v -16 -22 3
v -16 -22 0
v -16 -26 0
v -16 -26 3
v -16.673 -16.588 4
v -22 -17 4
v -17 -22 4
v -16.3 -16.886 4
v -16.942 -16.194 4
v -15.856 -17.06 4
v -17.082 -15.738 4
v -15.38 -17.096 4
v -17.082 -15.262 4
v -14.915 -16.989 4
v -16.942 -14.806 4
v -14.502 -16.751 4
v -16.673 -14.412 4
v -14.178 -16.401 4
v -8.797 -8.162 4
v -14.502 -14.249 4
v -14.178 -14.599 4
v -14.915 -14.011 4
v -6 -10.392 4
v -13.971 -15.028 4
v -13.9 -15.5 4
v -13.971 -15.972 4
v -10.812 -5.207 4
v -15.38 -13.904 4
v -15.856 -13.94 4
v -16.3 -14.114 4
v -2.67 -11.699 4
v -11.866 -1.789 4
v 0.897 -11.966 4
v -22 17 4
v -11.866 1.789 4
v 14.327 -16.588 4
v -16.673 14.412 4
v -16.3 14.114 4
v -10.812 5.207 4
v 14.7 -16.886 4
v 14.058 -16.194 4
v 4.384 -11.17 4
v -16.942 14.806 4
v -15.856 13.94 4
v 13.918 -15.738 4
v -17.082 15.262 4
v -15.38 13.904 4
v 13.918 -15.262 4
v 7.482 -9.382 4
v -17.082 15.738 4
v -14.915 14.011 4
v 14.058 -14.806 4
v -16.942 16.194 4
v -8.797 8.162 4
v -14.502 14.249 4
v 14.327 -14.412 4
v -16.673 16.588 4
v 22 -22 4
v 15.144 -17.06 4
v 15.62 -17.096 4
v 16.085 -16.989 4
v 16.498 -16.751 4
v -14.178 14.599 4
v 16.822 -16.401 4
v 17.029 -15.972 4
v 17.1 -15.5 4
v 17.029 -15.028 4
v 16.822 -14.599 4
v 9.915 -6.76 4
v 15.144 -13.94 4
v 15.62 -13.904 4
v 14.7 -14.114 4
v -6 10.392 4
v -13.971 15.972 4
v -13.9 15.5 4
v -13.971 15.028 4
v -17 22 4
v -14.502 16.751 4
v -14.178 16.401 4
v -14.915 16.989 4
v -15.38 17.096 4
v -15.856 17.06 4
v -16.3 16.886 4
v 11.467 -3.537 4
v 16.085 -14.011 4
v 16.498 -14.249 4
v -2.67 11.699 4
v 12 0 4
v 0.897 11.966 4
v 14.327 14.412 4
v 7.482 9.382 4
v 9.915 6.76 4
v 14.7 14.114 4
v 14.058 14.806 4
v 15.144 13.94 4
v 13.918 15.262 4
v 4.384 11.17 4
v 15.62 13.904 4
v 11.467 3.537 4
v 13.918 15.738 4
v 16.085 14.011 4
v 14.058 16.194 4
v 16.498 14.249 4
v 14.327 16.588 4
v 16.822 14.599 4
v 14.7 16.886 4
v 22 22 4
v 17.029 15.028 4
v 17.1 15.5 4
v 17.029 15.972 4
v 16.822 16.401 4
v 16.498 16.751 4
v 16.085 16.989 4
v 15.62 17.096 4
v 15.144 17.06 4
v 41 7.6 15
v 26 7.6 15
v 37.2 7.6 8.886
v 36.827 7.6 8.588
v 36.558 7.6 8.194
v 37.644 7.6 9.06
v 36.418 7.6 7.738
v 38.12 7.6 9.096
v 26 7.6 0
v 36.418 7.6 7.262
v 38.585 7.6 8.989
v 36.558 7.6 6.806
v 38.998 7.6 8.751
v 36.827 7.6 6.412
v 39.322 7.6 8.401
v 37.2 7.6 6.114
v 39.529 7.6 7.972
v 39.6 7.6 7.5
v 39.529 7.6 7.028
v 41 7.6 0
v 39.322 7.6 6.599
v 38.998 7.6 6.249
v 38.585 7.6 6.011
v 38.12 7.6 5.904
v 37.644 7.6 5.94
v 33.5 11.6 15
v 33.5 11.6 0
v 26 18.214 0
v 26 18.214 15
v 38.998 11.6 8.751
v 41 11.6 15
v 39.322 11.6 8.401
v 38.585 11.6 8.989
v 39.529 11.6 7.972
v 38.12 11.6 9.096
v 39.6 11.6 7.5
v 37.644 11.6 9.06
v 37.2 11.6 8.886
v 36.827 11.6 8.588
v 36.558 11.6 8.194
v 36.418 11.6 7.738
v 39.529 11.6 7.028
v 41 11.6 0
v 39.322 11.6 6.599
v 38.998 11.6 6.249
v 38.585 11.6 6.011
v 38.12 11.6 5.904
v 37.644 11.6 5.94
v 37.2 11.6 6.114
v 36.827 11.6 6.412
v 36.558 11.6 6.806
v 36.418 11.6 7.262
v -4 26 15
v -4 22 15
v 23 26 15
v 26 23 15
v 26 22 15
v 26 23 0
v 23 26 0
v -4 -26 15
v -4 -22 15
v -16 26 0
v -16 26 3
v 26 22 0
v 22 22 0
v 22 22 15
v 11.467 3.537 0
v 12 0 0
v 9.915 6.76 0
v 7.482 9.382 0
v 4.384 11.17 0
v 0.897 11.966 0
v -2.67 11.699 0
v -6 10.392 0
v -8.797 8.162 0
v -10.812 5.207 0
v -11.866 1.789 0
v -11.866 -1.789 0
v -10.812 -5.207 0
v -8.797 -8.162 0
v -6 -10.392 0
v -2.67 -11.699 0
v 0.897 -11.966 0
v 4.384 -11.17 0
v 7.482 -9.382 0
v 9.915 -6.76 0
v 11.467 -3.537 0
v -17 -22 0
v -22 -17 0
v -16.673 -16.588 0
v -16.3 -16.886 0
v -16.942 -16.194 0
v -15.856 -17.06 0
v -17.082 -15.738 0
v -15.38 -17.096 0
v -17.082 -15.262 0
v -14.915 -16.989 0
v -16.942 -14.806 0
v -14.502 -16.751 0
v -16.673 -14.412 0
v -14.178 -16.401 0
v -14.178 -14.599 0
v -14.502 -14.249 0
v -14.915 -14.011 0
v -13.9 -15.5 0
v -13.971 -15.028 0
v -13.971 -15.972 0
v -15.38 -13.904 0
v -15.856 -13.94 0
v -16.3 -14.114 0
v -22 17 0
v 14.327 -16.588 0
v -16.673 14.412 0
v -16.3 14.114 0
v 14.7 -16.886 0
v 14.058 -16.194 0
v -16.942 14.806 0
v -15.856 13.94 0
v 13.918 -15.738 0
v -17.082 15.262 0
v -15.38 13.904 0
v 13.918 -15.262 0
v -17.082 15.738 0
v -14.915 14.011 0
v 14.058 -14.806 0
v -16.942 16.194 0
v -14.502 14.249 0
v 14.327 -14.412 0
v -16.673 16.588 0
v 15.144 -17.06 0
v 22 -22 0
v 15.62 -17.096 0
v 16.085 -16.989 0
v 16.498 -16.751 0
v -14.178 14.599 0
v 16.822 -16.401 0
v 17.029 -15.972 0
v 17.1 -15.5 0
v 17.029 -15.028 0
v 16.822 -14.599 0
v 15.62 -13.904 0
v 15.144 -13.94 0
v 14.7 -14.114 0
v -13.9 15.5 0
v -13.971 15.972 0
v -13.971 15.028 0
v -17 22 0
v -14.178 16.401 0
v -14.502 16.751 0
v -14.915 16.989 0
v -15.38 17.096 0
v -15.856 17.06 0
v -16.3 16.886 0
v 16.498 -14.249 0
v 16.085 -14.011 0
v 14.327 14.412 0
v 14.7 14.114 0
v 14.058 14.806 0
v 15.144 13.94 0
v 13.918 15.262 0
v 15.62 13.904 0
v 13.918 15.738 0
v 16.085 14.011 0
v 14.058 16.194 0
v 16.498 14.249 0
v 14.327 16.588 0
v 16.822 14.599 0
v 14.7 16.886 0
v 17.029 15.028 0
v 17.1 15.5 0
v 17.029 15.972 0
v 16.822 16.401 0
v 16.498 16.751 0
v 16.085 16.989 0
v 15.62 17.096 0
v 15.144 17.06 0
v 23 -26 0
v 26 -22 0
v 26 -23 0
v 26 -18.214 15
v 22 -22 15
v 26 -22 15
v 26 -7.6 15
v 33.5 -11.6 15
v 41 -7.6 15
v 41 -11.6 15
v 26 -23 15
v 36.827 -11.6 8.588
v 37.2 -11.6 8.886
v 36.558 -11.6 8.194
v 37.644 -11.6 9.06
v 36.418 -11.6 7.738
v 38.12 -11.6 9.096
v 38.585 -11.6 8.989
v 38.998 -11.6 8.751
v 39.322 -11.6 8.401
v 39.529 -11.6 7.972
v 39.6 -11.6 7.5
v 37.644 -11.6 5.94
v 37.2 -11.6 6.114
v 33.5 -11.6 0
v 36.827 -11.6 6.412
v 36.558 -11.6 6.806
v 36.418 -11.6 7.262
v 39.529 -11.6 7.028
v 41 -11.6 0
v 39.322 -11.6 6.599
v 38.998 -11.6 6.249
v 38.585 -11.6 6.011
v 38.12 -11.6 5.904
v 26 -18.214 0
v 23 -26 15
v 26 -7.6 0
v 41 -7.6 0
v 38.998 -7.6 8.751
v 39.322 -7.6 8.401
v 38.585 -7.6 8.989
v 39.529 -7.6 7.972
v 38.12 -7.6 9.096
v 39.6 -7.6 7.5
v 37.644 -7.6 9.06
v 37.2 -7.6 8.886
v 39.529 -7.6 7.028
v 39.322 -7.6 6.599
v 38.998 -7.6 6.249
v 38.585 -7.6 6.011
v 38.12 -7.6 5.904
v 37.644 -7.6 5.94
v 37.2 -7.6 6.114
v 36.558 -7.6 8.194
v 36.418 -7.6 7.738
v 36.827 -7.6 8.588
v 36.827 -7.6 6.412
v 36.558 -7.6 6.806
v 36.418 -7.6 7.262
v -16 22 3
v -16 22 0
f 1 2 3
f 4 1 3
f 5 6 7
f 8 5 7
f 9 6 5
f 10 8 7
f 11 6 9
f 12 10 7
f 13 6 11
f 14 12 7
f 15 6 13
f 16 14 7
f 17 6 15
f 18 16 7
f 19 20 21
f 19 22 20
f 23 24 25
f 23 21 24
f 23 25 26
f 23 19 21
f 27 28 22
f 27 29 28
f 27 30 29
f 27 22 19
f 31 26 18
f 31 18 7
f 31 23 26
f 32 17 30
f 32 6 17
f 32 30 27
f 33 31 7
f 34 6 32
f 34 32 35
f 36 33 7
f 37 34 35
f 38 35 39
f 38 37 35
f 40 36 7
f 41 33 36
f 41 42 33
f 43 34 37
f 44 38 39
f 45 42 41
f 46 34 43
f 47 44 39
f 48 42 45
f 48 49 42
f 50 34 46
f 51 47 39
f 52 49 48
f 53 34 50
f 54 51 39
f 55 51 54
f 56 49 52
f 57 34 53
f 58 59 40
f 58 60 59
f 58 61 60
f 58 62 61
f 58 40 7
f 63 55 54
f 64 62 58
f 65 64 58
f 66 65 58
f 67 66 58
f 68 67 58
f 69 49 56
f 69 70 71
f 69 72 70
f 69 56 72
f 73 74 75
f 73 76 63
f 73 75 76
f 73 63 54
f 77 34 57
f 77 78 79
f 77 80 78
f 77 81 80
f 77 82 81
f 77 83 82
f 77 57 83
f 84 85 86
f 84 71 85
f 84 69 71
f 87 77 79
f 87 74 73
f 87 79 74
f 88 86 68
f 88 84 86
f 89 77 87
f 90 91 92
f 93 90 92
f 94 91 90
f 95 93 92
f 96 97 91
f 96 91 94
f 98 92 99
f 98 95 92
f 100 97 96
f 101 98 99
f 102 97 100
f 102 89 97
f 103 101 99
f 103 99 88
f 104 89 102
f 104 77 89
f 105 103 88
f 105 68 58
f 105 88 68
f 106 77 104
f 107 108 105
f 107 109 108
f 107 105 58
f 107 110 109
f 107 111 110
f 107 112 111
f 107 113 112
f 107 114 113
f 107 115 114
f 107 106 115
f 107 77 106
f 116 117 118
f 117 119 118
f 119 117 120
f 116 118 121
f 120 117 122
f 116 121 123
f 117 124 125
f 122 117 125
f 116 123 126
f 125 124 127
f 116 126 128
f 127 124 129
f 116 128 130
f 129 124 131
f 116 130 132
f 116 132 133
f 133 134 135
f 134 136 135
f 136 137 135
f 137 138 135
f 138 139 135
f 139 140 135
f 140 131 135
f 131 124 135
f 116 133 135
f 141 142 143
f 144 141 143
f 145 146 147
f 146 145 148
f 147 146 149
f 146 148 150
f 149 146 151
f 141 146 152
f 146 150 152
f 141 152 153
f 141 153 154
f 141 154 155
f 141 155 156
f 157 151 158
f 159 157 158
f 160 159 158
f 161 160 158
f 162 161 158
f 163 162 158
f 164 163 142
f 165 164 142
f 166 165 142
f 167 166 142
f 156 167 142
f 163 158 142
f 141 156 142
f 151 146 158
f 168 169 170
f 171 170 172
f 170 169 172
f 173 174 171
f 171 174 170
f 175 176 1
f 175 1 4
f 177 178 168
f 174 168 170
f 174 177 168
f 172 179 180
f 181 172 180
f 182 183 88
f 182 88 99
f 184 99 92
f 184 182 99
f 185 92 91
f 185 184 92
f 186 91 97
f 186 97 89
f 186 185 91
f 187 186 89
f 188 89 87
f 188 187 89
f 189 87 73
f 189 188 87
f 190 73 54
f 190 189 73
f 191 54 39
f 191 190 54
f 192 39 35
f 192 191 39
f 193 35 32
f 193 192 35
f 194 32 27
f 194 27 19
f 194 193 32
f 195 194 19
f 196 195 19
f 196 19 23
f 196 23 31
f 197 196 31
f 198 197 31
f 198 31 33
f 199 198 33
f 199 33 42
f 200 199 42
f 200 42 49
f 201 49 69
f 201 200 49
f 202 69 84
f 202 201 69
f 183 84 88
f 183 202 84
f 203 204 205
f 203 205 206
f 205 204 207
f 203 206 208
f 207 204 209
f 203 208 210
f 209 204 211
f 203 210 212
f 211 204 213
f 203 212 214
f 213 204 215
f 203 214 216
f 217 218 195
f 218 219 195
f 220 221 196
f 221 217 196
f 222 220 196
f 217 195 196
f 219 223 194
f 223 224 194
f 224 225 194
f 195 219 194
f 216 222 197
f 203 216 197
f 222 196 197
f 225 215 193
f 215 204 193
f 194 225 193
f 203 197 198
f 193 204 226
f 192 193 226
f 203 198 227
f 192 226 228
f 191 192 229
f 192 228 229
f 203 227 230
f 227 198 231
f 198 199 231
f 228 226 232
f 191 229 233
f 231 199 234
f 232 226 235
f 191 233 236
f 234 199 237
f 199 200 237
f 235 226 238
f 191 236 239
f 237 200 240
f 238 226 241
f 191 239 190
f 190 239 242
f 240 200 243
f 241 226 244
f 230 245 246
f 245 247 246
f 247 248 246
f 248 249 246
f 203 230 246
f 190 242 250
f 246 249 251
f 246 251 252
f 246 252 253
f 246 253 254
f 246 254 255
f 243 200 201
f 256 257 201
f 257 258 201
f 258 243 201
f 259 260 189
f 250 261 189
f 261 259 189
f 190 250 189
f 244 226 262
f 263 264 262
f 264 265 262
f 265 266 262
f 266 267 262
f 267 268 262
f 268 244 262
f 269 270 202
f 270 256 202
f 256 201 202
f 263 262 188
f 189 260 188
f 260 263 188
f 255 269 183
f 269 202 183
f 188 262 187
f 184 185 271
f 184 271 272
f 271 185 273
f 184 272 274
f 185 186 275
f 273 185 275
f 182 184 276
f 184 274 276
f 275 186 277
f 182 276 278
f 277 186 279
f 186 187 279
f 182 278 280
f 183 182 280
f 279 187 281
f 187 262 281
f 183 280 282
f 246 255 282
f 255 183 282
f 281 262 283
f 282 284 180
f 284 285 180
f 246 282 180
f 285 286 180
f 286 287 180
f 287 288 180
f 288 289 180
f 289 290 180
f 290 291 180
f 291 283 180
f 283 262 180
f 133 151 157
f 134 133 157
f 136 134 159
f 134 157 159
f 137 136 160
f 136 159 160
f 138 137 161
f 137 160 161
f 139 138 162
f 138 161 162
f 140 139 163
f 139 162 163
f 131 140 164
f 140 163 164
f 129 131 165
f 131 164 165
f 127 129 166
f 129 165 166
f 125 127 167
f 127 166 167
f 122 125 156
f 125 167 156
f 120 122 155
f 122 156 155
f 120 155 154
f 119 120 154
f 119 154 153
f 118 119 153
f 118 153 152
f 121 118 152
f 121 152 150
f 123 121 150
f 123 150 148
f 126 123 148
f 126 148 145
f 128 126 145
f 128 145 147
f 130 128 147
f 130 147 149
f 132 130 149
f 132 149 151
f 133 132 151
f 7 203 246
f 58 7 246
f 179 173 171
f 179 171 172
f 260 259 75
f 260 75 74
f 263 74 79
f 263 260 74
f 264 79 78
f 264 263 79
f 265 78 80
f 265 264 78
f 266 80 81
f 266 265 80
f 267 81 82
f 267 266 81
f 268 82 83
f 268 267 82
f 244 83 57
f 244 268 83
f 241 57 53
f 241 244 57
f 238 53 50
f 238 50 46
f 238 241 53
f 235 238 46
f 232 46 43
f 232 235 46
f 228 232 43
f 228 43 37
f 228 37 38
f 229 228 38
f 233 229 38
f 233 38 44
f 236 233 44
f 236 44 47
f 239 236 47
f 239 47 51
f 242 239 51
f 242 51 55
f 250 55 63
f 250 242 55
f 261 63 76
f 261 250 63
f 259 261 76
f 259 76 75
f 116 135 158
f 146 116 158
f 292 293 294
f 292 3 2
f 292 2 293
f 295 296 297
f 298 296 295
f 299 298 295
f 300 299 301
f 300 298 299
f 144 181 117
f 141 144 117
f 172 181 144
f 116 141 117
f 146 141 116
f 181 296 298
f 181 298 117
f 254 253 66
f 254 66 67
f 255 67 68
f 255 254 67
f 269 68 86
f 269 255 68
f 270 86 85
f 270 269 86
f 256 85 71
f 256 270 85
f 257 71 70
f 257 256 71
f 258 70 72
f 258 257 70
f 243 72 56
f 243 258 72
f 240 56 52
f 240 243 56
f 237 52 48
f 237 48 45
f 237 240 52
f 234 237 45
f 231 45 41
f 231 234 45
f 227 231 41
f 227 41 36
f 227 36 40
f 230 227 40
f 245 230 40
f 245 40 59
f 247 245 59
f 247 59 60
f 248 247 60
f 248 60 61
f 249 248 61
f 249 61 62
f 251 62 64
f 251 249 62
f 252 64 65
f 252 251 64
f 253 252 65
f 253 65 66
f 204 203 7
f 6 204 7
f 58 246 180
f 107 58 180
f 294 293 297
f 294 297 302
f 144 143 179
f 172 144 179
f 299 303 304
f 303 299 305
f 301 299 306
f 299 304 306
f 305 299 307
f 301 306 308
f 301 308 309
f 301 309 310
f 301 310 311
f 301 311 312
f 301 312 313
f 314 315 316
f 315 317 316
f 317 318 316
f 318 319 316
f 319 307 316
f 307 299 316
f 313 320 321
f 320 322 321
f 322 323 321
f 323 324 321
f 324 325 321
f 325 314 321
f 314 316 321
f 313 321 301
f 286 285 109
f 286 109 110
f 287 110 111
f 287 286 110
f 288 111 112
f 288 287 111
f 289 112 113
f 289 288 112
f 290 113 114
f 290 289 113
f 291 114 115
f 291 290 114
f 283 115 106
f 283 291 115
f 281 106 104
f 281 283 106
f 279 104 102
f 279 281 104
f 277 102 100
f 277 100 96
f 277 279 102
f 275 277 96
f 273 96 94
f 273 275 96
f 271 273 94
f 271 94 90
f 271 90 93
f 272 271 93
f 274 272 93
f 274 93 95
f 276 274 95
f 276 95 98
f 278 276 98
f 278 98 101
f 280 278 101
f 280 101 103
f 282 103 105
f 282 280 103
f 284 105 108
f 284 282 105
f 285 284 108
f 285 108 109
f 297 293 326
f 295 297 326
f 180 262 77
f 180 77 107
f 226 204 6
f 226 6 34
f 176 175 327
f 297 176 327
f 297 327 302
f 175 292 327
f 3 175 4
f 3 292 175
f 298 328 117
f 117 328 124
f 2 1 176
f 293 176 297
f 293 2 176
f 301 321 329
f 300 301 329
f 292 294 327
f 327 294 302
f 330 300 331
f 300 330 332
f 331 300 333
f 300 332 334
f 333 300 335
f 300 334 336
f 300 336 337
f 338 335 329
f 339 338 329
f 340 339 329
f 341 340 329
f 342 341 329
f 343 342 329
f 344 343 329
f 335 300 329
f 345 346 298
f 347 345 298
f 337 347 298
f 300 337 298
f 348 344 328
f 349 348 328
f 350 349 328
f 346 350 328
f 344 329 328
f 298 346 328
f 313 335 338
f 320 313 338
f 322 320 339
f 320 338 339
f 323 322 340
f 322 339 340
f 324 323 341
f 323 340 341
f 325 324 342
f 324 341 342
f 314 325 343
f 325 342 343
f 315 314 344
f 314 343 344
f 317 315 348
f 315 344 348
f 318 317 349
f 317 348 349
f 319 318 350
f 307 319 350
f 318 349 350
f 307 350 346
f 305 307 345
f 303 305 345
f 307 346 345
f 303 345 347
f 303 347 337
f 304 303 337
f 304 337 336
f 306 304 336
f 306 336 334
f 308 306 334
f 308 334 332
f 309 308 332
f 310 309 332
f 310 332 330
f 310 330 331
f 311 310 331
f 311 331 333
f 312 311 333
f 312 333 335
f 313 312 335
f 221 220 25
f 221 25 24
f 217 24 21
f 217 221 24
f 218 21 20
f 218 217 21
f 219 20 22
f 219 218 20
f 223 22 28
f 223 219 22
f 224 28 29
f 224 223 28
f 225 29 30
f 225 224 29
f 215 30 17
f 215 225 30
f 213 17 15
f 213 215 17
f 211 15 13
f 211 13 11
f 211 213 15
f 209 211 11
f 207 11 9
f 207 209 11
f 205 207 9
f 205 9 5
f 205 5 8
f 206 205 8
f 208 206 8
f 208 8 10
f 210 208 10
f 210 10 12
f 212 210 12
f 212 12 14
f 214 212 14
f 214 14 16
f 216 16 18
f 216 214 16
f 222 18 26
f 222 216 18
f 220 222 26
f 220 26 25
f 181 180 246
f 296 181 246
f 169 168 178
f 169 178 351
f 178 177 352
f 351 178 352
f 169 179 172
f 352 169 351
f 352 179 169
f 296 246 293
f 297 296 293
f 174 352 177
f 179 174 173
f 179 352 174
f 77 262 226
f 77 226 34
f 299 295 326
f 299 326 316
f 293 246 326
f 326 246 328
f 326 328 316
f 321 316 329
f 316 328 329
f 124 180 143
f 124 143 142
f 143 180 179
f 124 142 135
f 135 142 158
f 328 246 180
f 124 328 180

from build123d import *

# Parameters (mm, degrees)
F0_W       = 44
F0_H       = 44
F0_R       = 1.6
F0_R_2     = 12
F1_DEPTH   = 4
F2_SIZE    = 5
F4_DEPTH   = 15
F5_W       = 4
F5_H       = 4
F5_W_2     = 38
F6_DEPTH   = 15
F7_SIZE    = 12
F7_2_SIZE  = 12
F9_DEPTH   = 25
F10_SIZE   = 3
F10_2_SIZE = 3


with BuildPart() as f1:
    # F0 (on Top) → F1 (new body)
    with BuildSketch(Plane.XY):
        Rectangle(F0_W, F0_H)
        with Locations((-15.5, -15.5)):
            Circle(F0_R, mode=Mode.SUBTRACT)
        with Locations((15.5, -15.5)):
            Circle(F0_R, mode=Mode.SUBTRACT)
        with Locations((-15.5, 15.5)):
            Circle(F0_R, mode=Mode.SUBTRACT)
        Circle(F0_R_2, mode=Mode.SUBTRACT)
        with Locations((15.5, 15.5)):
            Circle(F0_R, mode=Mode.SUBTRACT)
    extrude(amount=F1_DEPTH)

    # F2
    f2_edges = [f1.edges().sort_by_distance(p)[0] for p in [
        (-22, 22, 2),
        (-22, -22, 2),
    ]]
    chamfer(f2_edges, length=F2_SIZE)


with BuildPart() as f4:
    # F3 (on Top) → F4 (new body)
    with BuildSketch(Plane.XY):
        Polygon((26, 11.6), (26, 7.6), (41, 7.6), (41, 11.6), (33.5, 11.6), align=None)
        Polygon((26, 18.2143782777), (26, 11.6), (33.5, 11.6), align=None)
        Polygon((41, -7.6), (26, -7.6), (26, -11.6), (33.5, -11.6), (41, -11.6), align=None)
        Polygon((33.5, -11.6), (26, -11.6), (26, -18.2143782777), align=None)
        Polygon((26, 0), (22, 0), (22, -22), (25.6346632391, -22), (26, -22), (26, -18.9712997526), (26, -18.2143782777), (26, -11.6), (26, -7.6), align=None)
        Polygon((22, 22), (22, 0), (26, 0), (26, 7.6), (26, 11.6), (26, 18.2143782777), (26, 21.6064173728), (26, 22), align=None)
    extrude(amount=F4_DEPTH)

    # F8 (on face) → F9 (cut)
    with BuildSketch(Plane(origin=(0, 11.6, 0), x_dir=(-1, 0, 0), z_dir=(0, 1, 0))):
        with BuildLine():
            ThreePointArc((-36.4, 7.5), (-38, 9.1), (-39.6, 7.5))
            ThreePointArc((-39.6, 7.5), (-38, 5.9), (-36.4, 7.5))
        make_face()
    extrude(amount=-F9_DEPTH, mode=Mode.SUBTRACT)


with BuildPart() as f6:
    # F5 (on face) → F6 (new body)
    with BuildSketch(Plane(origin=(0, 0, 0), x_dir=(1, 0, 0), z_dir=(0, 0, -1))):
        with Locations((24, -24)):
            Rectangle(F5_W, F5_H)
        with Locations((3, -24)):
            Rectangle(F5_W_2, F5_H)
    extrude(amount=-F6_DEPTH)

    # F7#2
    f7_2_edges = [f6.edges().sort_by_distance(p)[0] for p in [
        (-16, 24, 15),
    ]]
    chamfer(f7_2_edges, length=F7_2_SIZE)

    # F10#2
    f10_2_edges = [f6.edges().sort_by_distance(p)[0] for p in [
        (26, 26, 7.5),
    ]]
    chamfer(f10_2_edges, length=F10_2_SIZE)


with BuildPart() as f6b:
    # F5 (on face) → F6, piece 2 (new body)
    with BuildSketch(Plane(origin=(0, 0, 0), x_dir=(1, 0, 0), z_dir=(0, 0, -1))):
        with Locations((3, 24)):
            Rectangle(F5_W_2, F5_H)
        with Locations((24, 24)):
            Rectangle(F5_W, F5_H)
    extrude(amount=-F6_DEPTH)

    # F7
    f7_edges = [f6b.edges().sort_by_distance(p)[0] for p in [
        (-16, -24, 15),
    ]]
    chamfer(f7_edges, length=F7_SIZE)

    # F10
    f10_edges = [f6b.edges().sort_by_distance(p)[0] for p in [
        (26, -26, 7.5),
    ]]
    chamfer(f10_edges, length=F10_SIZE)


solid = Compound([f1.part, f4.part, f6.part, f6b.part])
